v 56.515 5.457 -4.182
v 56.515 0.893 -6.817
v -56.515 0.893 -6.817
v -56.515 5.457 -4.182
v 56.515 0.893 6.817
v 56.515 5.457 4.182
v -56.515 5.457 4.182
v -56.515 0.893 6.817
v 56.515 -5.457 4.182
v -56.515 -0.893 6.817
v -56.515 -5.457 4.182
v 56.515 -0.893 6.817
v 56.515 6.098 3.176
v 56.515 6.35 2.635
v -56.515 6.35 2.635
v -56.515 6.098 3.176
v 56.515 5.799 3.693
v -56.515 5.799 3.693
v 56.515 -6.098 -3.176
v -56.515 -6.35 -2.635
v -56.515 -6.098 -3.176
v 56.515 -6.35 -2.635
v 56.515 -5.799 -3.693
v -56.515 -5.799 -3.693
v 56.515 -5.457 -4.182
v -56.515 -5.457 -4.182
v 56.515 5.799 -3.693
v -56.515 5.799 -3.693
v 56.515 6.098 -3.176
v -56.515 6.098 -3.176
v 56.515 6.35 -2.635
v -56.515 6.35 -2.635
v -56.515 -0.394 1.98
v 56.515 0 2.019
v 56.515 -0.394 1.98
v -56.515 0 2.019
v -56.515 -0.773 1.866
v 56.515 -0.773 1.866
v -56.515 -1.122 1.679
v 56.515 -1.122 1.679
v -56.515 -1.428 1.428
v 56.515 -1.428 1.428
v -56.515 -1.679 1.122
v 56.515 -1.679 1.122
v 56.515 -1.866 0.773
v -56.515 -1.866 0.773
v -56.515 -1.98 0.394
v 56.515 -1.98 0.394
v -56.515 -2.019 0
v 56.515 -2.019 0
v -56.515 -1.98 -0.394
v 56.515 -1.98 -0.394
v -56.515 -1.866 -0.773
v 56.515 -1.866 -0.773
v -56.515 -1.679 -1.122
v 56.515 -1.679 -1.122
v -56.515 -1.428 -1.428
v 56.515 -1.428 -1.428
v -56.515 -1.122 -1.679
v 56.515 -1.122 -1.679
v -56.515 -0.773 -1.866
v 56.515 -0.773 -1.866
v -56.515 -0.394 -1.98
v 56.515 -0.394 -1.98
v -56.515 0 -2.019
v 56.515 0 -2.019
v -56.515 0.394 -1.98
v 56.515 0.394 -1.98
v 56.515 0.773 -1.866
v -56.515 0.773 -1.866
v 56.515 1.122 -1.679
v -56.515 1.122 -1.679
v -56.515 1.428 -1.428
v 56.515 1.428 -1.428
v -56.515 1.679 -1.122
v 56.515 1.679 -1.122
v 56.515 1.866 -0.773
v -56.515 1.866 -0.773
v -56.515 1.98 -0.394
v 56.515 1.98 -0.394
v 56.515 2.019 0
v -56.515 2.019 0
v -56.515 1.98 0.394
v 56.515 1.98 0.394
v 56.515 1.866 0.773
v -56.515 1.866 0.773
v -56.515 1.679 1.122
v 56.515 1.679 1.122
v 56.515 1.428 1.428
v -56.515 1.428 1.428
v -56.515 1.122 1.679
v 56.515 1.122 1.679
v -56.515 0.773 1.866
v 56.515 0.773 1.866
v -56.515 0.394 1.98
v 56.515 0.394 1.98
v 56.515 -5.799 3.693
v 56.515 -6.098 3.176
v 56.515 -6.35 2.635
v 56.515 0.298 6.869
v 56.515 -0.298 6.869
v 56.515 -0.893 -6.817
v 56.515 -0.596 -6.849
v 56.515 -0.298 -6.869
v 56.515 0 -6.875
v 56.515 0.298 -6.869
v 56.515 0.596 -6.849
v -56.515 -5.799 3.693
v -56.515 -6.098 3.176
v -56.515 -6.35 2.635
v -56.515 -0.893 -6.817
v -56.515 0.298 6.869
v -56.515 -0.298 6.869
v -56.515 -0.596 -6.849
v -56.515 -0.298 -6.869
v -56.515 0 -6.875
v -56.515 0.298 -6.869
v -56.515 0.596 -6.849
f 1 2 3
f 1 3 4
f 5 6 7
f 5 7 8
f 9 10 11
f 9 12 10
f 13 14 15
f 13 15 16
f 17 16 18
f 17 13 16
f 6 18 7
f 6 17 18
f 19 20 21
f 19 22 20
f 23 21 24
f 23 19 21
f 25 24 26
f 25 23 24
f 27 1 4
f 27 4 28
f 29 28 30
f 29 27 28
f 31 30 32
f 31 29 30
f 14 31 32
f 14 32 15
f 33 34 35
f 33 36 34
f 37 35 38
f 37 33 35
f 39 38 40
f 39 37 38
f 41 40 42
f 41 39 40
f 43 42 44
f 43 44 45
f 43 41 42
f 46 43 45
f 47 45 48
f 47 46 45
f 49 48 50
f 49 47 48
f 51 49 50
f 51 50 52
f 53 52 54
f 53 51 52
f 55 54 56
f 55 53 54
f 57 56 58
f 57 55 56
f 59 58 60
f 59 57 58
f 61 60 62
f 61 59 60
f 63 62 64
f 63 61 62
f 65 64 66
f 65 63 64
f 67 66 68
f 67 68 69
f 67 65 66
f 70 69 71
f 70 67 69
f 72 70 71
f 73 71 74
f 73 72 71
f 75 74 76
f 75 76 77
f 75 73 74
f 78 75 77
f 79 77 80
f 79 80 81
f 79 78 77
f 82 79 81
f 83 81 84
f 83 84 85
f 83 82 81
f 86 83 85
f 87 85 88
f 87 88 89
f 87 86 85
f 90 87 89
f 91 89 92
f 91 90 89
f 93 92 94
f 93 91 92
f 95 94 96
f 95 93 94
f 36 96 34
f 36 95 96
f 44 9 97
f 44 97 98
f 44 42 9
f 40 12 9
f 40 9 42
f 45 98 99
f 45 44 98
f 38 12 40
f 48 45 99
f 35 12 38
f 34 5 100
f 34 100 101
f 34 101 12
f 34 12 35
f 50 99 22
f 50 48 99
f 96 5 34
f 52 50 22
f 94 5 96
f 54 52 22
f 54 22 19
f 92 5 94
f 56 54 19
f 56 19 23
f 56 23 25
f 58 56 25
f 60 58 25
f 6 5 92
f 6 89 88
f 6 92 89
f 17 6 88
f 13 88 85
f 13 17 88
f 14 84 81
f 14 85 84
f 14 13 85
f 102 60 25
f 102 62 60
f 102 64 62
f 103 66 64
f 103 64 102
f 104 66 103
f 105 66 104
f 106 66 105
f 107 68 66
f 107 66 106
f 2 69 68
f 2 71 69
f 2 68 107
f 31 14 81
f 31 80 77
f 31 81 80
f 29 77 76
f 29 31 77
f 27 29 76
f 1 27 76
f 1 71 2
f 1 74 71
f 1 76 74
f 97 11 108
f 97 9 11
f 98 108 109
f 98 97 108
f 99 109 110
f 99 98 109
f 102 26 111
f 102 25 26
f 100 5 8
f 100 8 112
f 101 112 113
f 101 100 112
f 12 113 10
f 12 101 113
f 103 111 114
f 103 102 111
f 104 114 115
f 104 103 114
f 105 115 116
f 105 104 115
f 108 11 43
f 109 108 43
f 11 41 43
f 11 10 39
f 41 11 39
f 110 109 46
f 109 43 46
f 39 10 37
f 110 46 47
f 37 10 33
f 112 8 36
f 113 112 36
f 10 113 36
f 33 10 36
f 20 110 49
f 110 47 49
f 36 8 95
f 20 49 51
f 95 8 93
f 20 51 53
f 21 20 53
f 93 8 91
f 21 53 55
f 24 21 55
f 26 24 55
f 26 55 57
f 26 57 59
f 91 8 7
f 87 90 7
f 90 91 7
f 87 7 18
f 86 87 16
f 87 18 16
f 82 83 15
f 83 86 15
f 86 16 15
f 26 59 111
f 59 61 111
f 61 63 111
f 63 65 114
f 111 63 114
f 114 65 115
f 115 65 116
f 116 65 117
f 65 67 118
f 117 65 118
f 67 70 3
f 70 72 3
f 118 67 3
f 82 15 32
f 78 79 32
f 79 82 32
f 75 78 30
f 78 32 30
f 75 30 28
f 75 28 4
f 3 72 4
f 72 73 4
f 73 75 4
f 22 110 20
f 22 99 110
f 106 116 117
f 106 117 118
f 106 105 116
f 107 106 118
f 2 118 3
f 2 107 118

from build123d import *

# Parameters (mm, degrees)
SKETCH1_R           = 2.0193
BOSS_EXTRUDE1_DEPTH = 56.515


with BuildPart() as part:
    # Sketch1 → Boss-Extrude1 (new, symmetric)
    with BuildSketch(Plane(origin=(0, 0, 0), x_dir=(0, 0, -1), z_dir=(1, 0, 0))):
        with BuildLine():
            ThreePointArc((6.874999966, 0), (6.860422465, 0.447468582), (6.816751782, 0.893039571))
            Line((6.816751782, 0.893039571), (4.181770846, 5.456960429))
            ThreePointArc((4.181770846, 5.456960429), (3.437499983, 5.953924622), (2.634980936, 6.35))
            Line((2.634980936, 6.35), (-2.634980936, 6.35))
            ThreePointArc((-2.634980936, 6.35), (-3.437499983, 5.953924622), (-4.181770846, 5.456960429))
            Line((-4.181770846, 5.456960429), (-6.816751782, 0.893039571))
            ThreePointArc((-6.816751782, 0.893039571), (-6.874999966, 0), (-6.816751782, -0.893039571))
            Line((-6.816751782, -0.893039571), (-4.181770846, -5.456960429))
            ThreePointArc((-4.181770846, -5.456960429), (-3.437499983, -5.953924622), (-2.634980936, -6.35))
            Line((-2.634980936, -6.35), (2.634980936, -6.35))
            ThreePointArc((2.634980936, -6.35), (3.437499983, -5.953924622), (4.181770846, -5.456960429))
            Line((4.181770846, -5.456960429), (6.816751782, -0.893039571))
            ThreePointArc((6.816751782, -0.893039571), (6.860422465, -0.447468582), (6.874999966, 0))
        make_face()
        with Locations(Location((0, 0, 0), (0, 0, 180))):
            Circle(SKETCH1_R, mode=Mode.SUBTRACT)
    extrude(amount=BOSS_EXTRUDE1_DEPTH, both=True)


solid = part.part
